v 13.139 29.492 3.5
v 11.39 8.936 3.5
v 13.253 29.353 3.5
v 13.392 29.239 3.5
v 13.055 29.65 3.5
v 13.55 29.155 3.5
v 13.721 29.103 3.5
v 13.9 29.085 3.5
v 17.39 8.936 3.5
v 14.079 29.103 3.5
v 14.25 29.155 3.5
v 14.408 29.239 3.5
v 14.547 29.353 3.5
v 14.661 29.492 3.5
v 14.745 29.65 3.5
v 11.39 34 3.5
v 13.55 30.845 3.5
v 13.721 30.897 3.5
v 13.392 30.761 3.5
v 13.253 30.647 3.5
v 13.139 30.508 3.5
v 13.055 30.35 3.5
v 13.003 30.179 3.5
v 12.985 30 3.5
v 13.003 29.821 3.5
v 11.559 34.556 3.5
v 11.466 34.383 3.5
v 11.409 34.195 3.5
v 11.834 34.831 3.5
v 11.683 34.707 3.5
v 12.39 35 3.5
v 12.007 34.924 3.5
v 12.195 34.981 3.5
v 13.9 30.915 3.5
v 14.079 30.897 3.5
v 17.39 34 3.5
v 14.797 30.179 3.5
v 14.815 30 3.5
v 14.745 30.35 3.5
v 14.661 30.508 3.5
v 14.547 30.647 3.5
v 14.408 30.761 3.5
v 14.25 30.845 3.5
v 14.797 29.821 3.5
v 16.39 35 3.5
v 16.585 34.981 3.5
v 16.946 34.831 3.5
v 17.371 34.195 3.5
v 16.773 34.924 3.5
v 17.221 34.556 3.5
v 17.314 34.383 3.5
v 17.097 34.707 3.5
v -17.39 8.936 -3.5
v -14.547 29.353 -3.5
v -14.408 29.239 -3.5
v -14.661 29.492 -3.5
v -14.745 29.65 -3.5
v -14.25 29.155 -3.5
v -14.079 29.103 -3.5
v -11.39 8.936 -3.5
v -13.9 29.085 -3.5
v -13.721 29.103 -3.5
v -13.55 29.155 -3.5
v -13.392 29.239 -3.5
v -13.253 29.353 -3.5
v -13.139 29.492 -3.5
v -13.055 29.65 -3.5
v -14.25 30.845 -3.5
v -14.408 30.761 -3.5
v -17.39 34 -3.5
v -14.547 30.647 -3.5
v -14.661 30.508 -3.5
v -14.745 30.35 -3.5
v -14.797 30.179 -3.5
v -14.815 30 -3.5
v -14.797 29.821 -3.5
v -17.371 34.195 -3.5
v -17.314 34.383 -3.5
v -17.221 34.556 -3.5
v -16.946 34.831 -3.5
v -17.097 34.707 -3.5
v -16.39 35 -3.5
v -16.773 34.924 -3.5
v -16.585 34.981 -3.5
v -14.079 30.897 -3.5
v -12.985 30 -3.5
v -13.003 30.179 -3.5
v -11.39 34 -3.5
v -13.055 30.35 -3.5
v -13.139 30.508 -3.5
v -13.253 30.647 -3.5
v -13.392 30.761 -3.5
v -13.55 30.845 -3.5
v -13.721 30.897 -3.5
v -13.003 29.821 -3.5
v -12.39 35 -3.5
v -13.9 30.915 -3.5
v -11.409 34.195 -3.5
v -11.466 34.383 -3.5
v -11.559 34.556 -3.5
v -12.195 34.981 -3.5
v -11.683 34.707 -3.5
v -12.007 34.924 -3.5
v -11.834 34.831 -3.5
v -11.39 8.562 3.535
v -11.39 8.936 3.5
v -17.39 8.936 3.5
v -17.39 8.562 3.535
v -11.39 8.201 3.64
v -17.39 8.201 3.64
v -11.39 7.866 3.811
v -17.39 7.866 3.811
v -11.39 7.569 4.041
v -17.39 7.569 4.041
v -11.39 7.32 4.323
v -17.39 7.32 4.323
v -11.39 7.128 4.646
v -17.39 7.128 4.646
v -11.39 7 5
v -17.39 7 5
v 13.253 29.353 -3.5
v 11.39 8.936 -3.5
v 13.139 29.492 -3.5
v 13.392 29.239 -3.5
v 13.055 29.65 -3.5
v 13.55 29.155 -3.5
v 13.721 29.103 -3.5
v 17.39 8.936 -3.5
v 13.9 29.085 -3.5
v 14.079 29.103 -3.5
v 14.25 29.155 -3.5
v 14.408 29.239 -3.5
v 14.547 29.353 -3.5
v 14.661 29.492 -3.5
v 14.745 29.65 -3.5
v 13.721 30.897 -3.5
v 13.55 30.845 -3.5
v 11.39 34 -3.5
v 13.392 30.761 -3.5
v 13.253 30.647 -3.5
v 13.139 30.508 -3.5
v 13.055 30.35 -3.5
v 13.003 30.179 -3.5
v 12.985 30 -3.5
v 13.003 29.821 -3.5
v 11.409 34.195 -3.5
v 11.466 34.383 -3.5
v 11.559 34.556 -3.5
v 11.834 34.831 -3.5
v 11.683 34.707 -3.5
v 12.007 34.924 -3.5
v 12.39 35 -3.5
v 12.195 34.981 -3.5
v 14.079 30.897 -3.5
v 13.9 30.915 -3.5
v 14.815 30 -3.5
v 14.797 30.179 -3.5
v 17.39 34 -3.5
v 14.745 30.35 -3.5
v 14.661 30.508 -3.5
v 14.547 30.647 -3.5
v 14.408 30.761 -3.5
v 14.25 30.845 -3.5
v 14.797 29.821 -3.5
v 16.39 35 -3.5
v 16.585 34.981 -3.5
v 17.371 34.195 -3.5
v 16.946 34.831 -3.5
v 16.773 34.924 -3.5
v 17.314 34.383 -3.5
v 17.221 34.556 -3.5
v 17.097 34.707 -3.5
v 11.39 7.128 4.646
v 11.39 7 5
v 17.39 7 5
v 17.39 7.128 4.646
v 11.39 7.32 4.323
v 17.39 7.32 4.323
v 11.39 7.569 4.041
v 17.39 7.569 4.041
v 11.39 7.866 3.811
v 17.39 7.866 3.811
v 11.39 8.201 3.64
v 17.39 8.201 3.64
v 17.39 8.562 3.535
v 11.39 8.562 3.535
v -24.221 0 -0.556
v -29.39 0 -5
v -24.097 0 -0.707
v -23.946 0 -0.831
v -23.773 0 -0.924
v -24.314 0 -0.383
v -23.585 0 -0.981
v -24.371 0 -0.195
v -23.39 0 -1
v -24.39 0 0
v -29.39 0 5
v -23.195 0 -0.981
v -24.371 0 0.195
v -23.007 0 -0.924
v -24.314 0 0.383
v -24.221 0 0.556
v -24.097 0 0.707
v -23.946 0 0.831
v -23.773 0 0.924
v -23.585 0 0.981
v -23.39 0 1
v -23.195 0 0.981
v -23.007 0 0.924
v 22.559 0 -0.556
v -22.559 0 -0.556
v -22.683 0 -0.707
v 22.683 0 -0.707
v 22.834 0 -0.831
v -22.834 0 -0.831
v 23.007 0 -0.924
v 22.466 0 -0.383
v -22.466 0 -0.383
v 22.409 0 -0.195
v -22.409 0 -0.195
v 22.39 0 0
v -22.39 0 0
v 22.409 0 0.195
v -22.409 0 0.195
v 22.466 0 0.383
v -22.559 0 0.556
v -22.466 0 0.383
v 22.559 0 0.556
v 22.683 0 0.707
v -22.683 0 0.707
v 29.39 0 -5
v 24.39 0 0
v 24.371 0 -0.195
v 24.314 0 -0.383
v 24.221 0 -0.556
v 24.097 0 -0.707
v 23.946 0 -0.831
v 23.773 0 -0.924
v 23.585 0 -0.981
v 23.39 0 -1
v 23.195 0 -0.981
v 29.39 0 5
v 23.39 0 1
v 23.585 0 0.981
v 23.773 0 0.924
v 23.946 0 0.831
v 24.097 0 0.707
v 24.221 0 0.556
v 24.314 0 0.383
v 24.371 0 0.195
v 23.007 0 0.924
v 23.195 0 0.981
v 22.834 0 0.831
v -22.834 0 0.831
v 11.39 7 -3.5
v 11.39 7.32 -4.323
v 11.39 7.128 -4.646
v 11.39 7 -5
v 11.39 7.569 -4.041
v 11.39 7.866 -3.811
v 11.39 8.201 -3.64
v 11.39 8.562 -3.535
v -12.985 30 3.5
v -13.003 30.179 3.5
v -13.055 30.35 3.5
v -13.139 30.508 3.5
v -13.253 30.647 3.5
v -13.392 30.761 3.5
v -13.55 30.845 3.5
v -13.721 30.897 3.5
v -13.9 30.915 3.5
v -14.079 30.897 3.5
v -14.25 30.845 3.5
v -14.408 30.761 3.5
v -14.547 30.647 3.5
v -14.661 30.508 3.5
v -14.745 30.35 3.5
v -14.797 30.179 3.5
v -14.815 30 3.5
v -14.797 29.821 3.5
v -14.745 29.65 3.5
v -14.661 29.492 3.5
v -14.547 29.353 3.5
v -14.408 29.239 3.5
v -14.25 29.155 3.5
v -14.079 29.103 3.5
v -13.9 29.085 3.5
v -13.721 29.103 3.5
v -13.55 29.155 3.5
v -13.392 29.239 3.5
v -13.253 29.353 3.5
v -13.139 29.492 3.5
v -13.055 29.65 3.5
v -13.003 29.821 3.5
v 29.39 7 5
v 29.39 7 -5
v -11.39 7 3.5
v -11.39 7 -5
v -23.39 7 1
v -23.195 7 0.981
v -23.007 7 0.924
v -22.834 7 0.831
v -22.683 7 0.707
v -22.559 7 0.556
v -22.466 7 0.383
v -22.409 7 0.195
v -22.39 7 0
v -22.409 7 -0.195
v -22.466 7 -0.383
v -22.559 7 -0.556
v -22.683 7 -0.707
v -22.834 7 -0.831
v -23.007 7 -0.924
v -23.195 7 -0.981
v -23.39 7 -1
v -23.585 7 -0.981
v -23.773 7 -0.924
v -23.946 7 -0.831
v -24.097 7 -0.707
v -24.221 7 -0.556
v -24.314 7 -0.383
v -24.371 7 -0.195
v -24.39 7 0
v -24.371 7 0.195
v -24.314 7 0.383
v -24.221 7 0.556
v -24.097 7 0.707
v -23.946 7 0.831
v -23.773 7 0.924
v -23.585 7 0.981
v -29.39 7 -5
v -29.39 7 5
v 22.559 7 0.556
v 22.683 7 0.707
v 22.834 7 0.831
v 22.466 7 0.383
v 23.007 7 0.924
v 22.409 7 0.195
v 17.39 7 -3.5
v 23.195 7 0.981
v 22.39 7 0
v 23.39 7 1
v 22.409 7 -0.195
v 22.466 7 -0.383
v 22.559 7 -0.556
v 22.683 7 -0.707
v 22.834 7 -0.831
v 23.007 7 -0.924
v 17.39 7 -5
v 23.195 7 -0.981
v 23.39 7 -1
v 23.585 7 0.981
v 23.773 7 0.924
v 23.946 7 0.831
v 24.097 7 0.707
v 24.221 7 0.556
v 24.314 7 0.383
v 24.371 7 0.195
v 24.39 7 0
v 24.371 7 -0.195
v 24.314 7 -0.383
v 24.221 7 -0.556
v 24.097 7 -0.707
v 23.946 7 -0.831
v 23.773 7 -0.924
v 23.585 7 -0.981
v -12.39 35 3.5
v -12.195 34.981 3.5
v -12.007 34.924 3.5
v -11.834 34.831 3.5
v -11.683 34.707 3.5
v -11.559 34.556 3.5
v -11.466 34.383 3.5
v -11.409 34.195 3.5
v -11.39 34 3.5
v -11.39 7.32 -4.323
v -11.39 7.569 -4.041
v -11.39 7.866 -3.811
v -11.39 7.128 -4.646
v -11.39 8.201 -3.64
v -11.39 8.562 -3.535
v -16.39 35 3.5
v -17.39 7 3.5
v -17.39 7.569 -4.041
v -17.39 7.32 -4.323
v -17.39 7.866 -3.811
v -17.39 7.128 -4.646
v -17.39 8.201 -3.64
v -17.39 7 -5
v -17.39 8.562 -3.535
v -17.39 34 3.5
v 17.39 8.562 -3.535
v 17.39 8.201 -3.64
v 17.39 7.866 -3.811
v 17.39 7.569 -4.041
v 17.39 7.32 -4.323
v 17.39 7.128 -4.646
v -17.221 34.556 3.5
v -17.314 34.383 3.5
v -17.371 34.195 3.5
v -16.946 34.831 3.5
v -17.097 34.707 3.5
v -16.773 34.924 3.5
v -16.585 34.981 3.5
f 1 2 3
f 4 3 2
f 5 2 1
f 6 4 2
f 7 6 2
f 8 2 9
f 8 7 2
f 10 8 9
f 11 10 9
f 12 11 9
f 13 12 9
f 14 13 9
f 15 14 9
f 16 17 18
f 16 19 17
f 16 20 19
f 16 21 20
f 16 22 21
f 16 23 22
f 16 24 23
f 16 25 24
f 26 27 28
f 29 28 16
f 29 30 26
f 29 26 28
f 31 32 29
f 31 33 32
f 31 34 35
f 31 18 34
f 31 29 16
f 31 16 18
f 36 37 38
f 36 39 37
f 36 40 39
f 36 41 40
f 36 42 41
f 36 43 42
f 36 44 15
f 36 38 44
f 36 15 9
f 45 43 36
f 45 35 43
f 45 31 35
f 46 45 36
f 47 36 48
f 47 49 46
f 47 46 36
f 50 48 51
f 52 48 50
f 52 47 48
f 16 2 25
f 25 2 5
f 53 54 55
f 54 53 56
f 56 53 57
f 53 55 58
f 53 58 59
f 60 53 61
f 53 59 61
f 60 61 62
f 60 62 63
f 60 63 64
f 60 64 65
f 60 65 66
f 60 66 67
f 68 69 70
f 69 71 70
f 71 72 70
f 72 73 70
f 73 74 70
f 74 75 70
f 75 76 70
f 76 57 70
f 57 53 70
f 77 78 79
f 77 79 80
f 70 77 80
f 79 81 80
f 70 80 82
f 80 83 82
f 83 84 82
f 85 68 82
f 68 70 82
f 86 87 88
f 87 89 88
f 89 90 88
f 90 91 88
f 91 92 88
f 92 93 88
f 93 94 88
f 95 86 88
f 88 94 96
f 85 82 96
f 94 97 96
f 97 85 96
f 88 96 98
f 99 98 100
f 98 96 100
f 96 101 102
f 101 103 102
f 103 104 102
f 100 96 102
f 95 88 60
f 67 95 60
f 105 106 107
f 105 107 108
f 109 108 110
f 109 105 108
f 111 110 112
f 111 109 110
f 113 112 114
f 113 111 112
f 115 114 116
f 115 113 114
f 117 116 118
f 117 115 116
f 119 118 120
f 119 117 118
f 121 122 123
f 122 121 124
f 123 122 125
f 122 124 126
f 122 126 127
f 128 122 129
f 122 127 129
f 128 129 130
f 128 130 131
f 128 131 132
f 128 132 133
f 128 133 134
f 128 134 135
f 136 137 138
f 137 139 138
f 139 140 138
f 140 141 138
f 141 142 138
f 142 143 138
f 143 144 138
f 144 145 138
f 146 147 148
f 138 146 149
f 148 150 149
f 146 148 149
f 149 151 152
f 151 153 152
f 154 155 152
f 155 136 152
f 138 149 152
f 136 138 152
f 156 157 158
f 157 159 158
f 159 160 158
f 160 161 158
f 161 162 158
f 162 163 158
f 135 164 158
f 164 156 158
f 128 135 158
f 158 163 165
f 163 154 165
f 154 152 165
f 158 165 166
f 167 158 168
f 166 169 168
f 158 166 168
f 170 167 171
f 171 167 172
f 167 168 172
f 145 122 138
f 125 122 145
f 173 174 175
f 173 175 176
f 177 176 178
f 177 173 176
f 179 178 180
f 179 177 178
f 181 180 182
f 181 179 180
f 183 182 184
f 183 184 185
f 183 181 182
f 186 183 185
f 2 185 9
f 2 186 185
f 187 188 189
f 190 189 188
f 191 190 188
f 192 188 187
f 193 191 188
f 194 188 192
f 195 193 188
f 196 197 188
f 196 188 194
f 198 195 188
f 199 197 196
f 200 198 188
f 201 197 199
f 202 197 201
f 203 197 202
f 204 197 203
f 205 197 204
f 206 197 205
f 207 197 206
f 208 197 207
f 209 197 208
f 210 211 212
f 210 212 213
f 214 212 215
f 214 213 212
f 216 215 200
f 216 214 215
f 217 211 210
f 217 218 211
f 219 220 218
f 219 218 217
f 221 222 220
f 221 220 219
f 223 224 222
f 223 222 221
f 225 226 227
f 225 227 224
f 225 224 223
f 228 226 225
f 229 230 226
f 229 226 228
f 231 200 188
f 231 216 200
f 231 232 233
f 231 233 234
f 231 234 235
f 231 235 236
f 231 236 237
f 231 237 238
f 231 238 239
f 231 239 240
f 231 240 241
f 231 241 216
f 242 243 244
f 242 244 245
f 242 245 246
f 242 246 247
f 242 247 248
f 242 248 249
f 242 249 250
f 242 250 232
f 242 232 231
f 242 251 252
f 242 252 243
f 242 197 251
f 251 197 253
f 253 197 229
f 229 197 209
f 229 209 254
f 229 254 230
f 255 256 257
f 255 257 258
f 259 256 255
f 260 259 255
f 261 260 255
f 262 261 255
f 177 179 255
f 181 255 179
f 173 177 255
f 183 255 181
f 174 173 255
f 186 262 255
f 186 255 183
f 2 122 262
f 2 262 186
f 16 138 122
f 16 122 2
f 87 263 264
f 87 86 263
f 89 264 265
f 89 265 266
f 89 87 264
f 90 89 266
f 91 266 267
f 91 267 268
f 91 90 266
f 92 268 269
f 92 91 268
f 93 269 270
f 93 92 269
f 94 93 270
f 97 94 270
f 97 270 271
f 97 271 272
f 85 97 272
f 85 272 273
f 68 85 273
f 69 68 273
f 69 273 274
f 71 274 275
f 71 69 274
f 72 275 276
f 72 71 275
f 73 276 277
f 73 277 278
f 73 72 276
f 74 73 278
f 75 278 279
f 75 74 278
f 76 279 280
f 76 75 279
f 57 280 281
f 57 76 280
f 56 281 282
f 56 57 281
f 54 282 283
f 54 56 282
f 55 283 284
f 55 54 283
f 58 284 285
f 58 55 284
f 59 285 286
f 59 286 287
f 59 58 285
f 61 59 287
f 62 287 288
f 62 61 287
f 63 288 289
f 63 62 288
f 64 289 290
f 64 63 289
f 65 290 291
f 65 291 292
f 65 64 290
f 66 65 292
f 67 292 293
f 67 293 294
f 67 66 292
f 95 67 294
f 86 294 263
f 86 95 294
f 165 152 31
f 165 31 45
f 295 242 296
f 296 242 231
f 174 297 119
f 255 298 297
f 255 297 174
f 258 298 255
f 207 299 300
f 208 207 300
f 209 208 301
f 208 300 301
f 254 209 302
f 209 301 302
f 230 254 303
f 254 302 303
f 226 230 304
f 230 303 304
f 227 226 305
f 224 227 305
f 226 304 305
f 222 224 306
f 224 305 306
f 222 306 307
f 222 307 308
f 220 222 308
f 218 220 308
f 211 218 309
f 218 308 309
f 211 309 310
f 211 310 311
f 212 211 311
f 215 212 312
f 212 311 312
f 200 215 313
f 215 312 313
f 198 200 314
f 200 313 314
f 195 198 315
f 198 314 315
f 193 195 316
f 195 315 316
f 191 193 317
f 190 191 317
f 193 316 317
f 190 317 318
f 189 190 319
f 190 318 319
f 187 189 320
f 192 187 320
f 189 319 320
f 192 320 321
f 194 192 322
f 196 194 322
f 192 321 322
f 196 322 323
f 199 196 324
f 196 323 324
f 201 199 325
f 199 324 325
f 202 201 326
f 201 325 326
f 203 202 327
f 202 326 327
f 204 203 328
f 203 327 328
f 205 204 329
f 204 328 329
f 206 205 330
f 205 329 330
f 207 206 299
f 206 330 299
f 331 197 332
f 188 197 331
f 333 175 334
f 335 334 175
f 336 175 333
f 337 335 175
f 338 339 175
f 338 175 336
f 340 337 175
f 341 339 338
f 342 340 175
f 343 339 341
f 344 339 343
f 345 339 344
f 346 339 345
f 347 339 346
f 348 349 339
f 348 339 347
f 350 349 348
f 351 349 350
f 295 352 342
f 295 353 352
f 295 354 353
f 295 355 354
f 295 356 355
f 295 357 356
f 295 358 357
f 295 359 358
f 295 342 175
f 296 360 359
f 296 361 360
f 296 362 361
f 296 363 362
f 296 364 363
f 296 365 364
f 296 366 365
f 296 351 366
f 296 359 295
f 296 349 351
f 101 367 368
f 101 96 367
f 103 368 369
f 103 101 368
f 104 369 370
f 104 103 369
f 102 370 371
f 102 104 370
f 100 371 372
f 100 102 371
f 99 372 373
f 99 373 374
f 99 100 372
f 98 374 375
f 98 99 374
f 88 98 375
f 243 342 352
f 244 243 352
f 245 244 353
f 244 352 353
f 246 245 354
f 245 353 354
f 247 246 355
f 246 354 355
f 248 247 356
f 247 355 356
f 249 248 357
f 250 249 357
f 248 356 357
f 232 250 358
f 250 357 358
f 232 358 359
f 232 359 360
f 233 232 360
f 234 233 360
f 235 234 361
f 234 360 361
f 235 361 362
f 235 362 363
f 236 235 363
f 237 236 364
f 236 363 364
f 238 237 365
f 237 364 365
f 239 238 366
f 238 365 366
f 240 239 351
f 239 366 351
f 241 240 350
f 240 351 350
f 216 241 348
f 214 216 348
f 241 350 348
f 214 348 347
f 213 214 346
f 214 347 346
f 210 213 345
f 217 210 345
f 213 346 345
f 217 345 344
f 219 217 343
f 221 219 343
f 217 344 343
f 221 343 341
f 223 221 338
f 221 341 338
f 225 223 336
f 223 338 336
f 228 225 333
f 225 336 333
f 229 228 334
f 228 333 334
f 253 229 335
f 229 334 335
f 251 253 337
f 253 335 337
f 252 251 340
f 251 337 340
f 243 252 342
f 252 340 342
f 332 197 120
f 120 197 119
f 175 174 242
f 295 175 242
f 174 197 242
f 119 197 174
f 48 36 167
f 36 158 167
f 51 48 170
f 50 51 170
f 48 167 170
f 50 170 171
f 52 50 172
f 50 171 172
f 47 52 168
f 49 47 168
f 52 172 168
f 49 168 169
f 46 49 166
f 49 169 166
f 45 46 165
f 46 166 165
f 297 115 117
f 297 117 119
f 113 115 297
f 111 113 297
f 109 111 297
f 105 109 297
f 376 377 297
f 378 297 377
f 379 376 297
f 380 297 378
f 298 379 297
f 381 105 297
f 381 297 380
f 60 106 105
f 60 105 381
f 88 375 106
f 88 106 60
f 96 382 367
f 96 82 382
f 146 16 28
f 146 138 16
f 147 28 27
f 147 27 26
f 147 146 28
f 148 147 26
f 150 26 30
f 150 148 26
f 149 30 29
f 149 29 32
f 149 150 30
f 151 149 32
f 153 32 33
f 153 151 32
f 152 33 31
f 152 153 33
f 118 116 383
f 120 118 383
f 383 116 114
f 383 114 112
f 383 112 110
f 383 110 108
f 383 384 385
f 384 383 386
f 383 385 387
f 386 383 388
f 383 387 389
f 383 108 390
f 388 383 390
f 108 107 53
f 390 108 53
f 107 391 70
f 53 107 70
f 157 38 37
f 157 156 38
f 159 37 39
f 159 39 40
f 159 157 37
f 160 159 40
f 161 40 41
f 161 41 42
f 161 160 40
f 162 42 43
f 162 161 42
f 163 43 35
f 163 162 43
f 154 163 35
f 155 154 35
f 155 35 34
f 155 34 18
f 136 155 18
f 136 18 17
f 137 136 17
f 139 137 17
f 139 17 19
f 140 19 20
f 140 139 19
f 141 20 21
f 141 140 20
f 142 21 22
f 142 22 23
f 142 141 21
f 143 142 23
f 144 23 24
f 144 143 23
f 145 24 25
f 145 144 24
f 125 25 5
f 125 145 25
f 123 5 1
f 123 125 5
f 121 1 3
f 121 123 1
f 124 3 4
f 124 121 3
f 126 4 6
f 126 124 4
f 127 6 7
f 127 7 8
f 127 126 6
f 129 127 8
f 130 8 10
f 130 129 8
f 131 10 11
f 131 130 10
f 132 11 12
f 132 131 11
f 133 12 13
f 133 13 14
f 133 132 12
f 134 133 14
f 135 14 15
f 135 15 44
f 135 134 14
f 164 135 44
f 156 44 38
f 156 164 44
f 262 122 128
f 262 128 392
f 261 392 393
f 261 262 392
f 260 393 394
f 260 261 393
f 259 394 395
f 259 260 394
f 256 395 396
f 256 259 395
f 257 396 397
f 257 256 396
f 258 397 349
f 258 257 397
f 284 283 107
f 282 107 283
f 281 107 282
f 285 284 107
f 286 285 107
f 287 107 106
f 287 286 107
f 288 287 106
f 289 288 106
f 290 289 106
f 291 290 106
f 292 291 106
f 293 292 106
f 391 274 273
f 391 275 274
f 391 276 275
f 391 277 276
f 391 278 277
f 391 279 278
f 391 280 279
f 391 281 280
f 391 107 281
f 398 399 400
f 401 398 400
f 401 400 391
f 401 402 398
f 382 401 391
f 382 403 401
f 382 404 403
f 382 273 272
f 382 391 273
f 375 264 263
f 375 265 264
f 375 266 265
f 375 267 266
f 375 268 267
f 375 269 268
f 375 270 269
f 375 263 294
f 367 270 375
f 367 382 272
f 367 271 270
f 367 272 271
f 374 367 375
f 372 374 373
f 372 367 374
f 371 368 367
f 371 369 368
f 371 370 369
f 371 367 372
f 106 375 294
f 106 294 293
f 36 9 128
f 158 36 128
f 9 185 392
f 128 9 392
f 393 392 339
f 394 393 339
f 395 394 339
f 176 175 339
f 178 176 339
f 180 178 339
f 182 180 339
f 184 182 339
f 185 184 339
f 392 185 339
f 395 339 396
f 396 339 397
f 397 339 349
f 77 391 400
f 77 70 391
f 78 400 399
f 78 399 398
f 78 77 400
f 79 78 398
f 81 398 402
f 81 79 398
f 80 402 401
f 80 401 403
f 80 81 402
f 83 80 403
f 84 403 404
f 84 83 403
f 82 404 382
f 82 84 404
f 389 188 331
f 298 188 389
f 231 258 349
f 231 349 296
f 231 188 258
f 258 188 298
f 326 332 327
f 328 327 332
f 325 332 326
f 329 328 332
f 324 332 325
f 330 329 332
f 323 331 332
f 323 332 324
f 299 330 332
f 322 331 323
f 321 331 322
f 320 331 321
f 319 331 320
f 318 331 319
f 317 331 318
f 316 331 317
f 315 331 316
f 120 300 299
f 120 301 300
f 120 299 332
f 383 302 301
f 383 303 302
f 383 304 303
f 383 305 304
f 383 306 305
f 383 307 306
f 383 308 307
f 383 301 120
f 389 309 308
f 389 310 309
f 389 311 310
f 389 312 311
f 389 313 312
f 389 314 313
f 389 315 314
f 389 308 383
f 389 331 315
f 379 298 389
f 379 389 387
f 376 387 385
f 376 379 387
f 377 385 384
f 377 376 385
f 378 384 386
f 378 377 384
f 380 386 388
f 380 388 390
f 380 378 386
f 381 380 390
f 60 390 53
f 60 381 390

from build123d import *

# Parameters (mm, degrees)
SKETCH1_W         = 58.78
SKETCH1_H         = 10
BASE_DEPTH        = 7
SKETCH4_W         = 6
SKETCH4_H         = 35
SKETCH4_R         = 0.915
FLANGE_DEPTH      = 3.5
HOLE_R            = 1
BOTTOM_HOLE_DEPTH = 7
BOTTOM_FILLET_R   = 2
TOP_FILLET_R      = 1


with BuildPart() as part:
    # Sketch1 → Base (new body)
    with BuildSketch(Plane(origin=(0, 0, 0), x_dir=(1, 0, 0), z_dir=(0, 1, 0))):
        Rectangle(SKETCH1_W, SKETCH1_H)
    extrude(amount=BASE_DEPTH)

    # Sketch4 → Flange (add, symmetric)
    # profile 1 of 2: a face of its own
    with BuildSketch(Plane.XY):
        with Locations((-14.39, 17.5)):
            Rectangle(SKETCH4_W, SKETCH4_H)
        with Locations((-13.9, 30)):
            Circle(SKETCH4_R, mode=Mode.SUBTRACT)
    # profile 2 of 2: a face of its own
    with BuildSketch(Plane.XY):
        with Locations((14.39, 17.5)):
            Rectangle(SKETCH4_W, SKETCH4_H)
        with Locations((13.9, 30)):
            Circle(SKETCH4_R, mode=Mode.SUBTRACT)
    extrude(amount=FLANGE_DEPTH, both=True)

    # Hole → Bottom Hole (cut)
    with BuildSketch(Plane(origin=(0, 7, 0), x_dir=(1, 0, 0), z_dir=(0, 1, 0))):
        with Locations(Location((-23.39, 0, 0), (0, 0, 270))):
            Circle(HOLE_R)
        with Locations(Location((23.39, 0, 0), (0, 0, 270))):
            Circle(HOLE_R)
    extrude(amount=-BOTTOM_HOLE_DEPTH, mode=Mode.SUBTRACT)

    # Bottom Fillet
    # the kernel refuses this fillet: 2 mm, written as the material it adds along each edge
    with BuildSketch(Plane(origin=(-11.39, 7, -3.5), x_dir=(0, 0, -1), z_dir=(-1, 0, 0)), Plane(origin=(11.39, 7, 3.5), x_dir=(0, 0, 1), z_dir=(1, 0, 0))) as bottom_fillet_piece_1:
        with BuildLine():
            CenterArc((2, -1.936491673), BOTTOM_FILLET_R, 104.477512186, 75.522487814)
            Line((0, -1.936491673), (-0.04, -1.936491673))
            Line((-0.04, -1.936491673), (-0.04, 0))
            Line((-0.04, 0), (0, 0.04))
            ThreePointArc((0, 0.04), (0.75, 0.04), (1.49, 0.038729833))
            Line((1.49, 0.038729833), (1.5, 0))
        make_face()
    extrude(amount=6)
    with BuildSketch(Plane(origin=(-11.39, 7, 3.5), x_dir=(0, 0, 1), z_dir=(-1, 0, 0)), Plane(origin=(11.39, 7, -3.5), x_dir=(0, 0, -1), z_dir=(1, 0, 0))) as bottom_fillet_piece_2:
        with BuildLine():
            CenterArc((2, 1.936491673), BOTTOM_FILLET_R, 180, 75.522487814)
            Line((0, 1.936491673), (-0.04, 1.936491673))
            Line((-0.04, 1.936491673), (-0.04, 0))
            Line((-0.04, 0), (0, -0.04))
            ThreePointArc((0, -0.04), (0.75, -0.04), (1.49, -0.038729833))
            Line((1.49, -0.038729833), (1.5, 0))
        make_face()
    extrude(amount=6)

    # Top Fillet
    top_fillet_edges = [part.edges().sort_by_distance(p)[0] for p in [
        (-17.39, 35, 0),
        (-11.39, 35, 0),
        (11.39, 35, 0),
        (17.39, 35, 0),
    ]]
    fillet(top_fillet_edges, radius=TOP_FILLET_R)


solid = part.part
